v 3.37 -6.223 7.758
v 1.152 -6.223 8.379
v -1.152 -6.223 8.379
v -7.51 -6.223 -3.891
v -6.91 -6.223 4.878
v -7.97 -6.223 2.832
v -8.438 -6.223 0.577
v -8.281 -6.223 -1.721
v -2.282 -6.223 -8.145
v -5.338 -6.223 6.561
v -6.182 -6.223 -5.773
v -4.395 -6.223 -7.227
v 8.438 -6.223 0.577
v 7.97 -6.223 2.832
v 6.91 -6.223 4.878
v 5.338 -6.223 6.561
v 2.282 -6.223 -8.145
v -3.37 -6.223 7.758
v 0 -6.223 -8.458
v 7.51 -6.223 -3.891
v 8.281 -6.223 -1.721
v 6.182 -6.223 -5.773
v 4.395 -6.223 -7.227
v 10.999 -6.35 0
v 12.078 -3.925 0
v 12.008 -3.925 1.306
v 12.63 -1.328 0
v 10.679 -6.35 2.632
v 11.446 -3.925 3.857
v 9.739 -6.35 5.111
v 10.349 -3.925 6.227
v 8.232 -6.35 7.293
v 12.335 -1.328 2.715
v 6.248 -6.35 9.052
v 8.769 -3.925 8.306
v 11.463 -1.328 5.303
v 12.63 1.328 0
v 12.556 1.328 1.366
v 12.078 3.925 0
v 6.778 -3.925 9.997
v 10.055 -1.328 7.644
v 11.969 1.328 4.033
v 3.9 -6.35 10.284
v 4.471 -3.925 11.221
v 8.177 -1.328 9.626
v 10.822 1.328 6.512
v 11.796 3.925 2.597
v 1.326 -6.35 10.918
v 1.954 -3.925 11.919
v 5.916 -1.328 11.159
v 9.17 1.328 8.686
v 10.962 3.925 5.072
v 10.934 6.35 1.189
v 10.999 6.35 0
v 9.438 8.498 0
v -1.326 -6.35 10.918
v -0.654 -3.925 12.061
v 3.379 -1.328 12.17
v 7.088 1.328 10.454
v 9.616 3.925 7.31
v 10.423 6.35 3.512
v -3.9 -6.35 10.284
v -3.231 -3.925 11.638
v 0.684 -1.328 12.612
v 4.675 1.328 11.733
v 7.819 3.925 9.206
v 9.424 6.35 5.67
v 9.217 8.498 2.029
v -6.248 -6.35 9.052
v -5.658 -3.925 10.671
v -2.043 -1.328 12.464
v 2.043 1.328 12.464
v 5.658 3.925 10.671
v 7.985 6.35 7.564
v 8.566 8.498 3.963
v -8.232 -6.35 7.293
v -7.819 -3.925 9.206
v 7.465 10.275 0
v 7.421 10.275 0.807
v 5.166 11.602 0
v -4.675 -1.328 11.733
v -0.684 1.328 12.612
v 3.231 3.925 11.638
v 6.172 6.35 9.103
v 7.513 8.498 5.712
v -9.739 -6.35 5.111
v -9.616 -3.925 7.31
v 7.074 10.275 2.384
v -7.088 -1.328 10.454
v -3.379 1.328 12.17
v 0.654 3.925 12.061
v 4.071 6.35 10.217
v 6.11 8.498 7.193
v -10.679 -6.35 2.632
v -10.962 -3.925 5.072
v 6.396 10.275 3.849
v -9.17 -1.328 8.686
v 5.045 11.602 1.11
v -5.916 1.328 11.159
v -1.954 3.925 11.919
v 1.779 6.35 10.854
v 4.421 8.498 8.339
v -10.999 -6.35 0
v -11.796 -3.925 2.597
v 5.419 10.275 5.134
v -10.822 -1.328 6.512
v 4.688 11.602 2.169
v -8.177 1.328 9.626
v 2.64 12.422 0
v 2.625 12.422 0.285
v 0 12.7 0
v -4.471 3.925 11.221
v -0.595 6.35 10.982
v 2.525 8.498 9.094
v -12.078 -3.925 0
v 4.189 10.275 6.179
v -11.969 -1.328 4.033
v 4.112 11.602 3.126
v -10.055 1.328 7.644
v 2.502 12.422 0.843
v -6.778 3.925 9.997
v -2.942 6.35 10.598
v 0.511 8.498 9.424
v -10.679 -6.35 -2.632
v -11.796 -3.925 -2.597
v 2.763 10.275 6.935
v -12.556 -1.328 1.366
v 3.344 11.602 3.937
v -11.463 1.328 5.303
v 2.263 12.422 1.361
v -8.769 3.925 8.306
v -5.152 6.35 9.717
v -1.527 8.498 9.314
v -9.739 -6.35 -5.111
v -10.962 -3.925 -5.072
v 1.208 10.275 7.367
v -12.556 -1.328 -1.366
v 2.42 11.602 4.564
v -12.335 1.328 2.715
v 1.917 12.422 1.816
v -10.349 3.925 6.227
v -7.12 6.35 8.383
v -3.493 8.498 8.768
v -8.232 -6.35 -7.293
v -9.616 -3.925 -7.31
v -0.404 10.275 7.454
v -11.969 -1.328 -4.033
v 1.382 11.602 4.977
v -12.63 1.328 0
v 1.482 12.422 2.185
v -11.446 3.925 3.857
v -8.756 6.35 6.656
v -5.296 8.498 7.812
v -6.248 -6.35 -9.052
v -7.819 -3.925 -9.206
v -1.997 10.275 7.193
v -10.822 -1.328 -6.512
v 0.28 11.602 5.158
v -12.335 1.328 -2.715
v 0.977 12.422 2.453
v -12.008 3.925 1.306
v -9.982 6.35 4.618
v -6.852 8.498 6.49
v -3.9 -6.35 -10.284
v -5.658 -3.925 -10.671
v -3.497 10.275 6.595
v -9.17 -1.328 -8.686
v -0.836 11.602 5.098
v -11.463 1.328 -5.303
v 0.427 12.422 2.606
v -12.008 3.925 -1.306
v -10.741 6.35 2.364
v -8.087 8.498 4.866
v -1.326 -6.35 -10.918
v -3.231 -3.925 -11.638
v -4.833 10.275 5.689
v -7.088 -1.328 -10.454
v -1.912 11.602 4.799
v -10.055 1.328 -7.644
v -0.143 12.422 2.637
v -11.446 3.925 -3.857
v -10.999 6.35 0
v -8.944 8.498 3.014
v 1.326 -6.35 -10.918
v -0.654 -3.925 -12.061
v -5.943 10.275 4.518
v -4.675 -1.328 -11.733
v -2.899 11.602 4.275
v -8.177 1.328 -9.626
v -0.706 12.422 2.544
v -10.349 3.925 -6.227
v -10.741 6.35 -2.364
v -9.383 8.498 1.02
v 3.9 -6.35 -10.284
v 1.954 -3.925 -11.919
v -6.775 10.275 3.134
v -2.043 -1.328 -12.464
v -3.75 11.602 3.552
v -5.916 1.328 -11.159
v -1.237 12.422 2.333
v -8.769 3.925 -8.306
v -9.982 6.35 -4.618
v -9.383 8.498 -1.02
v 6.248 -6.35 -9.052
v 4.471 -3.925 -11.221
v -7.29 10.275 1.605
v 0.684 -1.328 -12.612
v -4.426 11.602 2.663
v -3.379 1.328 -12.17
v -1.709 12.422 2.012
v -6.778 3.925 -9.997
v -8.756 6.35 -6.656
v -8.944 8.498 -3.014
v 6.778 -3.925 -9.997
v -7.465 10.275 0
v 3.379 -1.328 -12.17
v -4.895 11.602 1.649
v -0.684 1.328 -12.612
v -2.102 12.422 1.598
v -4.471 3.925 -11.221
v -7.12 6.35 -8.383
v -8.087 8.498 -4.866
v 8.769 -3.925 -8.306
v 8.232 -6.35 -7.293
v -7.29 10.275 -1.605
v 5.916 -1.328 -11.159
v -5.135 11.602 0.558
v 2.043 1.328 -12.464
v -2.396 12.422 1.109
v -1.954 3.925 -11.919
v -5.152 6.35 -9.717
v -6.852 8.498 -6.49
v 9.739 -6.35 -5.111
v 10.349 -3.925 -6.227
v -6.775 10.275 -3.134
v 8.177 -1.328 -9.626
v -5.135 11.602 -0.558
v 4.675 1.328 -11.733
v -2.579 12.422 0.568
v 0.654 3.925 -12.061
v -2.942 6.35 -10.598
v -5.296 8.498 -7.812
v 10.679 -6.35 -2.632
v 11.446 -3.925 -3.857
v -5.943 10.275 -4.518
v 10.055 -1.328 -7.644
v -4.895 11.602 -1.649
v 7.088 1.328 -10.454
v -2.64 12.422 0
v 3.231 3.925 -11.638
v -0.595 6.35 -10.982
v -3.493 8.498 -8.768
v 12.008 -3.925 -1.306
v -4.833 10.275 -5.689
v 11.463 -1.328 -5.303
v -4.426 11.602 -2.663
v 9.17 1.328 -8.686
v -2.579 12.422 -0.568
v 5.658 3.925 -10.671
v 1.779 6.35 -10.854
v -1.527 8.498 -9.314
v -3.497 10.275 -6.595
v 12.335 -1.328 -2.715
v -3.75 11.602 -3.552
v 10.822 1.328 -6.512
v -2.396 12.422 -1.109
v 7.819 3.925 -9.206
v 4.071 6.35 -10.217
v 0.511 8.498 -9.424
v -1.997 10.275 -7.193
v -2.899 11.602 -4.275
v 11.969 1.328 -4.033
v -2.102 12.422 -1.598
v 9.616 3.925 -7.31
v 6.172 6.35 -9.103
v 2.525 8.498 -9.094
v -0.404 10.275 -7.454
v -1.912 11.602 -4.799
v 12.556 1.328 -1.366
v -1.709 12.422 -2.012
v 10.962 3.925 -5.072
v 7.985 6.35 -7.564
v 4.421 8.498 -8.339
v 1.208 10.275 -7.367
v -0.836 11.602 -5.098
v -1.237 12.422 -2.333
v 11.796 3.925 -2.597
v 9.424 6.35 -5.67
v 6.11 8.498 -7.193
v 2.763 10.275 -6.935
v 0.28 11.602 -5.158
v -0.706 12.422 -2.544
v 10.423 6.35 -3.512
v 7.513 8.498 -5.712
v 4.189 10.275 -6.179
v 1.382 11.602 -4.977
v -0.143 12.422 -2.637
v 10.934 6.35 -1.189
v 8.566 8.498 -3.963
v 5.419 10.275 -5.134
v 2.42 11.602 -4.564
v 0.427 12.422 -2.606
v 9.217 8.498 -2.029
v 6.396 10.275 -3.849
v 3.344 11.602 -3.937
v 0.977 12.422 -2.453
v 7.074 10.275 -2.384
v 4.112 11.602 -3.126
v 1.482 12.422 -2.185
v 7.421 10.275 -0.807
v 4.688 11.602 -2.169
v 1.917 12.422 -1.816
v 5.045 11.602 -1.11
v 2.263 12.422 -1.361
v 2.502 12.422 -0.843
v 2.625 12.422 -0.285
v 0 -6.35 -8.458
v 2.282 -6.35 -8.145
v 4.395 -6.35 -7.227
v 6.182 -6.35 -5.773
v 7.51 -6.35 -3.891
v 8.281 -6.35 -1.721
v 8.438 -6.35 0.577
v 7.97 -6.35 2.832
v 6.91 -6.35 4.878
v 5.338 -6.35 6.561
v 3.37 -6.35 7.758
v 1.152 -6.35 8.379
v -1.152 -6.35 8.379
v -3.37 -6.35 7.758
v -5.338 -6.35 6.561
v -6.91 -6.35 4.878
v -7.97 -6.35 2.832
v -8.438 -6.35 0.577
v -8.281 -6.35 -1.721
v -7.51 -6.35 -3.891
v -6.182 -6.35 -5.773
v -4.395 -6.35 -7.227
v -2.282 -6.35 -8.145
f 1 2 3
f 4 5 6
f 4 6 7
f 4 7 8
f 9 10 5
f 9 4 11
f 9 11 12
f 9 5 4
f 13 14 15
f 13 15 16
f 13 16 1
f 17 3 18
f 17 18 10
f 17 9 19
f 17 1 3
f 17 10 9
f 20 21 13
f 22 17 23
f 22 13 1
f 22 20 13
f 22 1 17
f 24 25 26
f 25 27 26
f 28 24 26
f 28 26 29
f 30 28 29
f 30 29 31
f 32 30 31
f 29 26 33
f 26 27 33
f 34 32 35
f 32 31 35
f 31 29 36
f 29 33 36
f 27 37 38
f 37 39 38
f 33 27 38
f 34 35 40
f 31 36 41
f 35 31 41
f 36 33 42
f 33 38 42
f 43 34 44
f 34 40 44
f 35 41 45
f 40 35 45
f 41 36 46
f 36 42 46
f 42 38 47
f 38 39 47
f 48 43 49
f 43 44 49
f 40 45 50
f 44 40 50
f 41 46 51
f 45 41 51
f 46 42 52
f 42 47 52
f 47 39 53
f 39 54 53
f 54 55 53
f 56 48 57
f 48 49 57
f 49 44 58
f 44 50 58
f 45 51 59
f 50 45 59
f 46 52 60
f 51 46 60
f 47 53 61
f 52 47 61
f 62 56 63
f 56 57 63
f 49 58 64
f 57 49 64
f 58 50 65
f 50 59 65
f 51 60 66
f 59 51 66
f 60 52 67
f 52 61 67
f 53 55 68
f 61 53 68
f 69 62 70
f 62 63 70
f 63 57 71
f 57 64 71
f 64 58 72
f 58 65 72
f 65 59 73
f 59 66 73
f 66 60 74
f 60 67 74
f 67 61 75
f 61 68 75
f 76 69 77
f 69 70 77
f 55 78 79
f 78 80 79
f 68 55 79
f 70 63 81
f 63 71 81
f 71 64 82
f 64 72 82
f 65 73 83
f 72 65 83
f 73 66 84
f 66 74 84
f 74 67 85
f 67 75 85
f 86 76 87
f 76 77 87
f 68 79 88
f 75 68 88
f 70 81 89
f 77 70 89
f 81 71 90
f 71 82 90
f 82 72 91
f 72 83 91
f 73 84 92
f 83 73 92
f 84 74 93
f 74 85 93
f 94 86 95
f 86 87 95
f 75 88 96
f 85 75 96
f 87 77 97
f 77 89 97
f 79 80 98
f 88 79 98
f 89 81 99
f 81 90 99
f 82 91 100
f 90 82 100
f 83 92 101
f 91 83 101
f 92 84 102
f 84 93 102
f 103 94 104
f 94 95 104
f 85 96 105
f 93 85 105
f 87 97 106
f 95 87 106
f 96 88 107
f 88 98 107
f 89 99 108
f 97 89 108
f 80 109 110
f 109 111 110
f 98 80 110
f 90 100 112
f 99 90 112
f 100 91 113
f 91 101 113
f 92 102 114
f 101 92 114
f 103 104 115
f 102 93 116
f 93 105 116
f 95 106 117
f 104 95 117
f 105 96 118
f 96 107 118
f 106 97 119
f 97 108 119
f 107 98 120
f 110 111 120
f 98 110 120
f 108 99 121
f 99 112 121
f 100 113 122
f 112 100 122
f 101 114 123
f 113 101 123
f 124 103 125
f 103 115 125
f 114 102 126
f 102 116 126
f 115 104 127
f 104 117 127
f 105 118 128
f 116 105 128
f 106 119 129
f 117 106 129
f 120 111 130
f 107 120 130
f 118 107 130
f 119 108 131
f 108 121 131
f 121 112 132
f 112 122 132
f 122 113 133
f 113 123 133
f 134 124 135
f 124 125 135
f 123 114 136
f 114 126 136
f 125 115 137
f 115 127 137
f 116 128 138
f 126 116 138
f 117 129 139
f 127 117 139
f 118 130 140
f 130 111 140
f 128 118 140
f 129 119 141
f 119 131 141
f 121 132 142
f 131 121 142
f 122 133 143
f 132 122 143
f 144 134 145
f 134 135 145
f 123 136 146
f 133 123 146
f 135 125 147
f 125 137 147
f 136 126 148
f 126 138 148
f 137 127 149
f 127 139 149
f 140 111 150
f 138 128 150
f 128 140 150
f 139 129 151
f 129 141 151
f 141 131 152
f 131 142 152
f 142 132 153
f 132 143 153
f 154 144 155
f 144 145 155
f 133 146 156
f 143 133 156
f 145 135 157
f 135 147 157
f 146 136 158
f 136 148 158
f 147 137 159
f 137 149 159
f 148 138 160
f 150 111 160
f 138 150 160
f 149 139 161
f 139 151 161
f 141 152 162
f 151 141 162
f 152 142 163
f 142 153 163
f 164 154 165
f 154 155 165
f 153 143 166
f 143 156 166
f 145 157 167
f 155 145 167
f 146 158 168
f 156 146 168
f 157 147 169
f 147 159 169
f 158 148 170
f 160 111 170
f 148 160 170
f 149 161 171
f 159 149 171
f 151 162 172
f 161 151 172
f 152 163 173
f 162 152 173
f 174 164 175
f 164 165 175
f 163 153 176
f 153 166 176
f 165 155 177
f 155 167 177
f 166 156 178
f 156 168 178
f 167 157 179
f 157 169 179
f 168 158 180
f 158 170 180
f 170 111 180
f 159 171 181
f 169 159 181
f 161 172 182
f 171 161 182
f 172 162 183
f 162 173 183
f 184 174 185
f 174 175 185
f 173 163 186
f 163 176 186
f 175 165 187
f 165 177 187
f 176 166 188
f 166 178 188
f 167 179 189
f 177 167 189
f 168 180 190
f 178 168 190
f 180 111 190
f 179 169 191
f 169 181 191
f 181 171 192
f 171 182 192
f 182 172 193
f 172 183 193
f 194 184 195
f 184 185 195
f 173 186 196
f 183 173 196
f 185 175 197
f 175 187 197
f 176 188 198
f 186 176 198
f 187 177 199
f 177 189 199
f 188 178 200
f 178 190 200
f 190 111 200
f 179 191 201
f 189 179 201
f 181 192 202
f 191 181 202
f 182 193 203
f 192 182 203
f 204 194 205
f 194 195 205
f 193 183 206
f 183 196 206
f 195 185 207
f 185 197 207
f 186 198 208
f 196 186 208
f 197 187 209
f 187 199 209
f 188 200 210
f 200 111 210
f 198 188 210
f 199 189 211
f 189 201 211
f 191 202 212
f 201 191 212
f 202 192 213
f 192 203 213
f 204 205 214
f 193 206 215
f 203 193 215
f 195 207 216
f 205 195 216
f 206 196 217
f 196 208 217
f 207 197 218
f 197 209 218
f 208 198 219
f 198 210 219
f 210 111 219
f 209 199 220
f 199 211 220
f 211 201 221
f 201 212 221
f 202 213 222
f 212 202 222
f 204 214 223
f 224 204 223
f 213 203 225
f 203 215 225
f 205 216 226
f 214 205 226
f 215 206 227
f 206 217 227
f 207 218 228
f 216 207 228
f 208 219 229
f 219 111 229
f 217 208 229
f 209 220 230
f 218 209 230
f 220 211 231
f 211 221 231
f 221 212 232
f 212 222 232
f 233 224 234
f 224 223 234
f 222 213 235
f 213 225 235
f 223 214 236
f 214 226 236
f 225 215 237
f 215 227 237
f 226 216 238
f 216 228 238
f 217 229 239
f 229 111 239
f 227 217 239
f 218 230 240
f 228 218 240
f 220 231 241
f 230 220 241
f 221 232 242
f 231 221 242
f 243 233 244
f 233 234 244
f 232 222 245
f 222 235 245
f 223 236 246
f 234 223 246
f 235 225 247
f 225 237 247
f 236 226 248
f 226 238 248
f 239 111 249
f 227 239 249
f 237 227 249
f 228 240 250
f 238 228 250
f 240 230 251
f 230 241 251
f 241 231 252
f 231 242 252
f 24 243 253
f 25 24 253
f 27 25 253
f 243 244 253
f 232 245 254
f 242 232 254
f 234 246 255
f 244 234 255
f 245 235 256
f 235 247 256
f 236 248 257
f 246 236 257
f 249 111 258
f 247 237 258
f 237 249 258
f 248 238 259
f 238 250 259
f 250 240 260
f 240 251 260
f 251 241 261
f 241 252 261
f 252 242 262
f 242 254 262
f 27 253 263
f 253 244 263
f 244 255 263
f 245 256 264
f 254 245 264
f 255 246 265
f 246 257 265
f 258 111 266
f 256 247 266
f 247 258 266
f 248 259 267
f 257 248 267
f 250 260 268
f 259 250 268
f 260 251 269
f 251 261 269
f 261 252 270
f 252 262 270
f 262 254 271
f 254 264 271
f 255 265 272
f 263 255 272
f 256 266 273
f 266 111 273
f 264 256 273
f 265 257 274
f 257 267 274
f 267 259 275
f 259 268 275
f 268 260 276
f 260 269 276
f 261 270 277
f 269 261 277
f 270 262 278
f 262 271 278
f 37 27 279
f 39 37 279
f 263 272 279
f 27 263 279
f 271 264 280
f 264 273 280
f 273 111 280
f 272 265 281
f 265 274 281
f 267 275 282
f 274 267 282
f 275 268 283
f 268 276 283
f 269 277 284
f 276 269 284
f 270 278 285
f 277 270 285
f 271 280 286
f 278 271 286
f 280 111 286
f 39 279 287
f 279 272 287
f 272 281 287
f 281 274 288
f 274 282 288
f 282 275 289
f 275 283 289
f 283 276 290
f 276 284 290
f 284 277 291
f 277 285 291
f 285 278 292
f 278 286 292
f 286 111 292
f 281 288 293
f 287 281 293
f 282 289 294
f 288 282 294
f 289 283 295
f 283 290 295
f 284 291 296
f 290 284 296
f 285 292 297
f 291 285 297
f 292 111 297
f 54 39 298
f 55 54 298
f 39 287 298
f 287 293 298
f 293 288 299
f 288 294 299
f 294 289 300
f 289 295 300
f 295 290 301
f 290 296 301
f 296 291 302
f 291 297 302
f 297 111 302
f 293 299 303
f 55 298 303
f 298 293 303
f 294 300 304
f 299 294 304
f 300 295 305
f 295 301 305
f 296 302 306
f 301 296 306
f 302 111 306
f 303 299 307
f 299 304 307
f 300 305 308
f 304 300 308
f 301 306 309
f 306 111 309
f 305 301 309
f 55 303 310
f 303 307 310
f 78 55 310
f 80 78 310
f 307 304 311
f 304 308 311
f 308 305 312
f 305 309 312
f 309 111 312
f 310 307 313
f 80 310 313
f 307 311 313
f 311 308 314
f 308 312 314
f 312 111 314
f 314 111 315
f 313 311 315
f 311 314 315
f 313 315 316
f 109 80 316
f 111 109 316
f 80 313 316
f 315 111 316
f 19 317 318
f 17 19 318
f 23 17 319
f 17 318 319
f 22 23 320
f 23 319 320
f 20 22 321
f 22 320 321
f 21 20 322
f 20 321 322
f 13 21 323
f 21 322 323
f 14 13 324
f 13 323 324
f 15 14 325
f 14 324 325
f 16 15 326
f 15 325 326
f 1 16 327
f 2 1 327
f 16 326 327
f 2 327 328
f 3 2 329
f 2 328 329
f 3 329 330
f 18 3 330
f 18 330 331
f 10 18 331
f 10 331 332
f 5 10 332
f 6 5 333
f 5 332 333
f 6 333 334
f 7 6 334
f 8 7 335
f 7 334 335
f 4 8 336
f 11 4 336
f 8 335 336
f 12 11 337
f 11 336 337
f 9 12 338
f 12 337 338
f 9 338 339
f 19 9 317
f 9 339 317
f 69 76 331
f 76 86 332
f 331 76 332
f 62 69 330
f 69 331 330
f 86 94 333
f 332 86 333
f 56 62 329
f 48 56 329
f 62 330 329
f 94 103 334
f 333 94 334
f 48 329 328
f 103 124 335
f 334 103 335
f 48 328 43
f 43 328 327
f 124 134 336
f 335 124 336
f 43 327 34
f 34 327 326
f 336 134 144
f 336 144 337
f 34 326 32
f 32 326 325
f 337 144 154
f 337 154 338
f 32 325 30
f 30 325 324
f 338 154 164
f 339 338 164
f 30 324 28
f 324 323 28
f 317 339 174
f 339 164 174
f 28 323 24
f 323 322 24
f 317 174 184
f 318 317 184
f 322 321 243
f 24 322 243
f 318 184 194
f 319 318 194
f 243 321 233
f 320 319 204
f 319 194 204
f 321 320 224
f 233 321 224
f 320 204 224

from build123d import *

# Parameters (mm, degrees)
TRUNCATED_BALL_DEPTH      = 13.7
TRUNCATED_BALL_DEPTH_BACK = 13.7
SKETCH3_R                 = 8.4582
RECESSED_DEPTH            = 0.127


with BuildPart() as part:
    # Sketch1 → Complete_Ball (revolve)
    with BuildSketch(Plane.XY):
        with BuildLine():
            Line((0, 12.7), (0, -12.7))
            ThreePointArc((0, -12.7), (12.7, 0), (0, 12.7))
        make_face()
    revolve(axis=Axis((0, 13.6525, 0), (0, -1, 0)))

    # Sketch2 → Truncated_ball (cut, two sides)
    with BuildSketch(Plane.XY) as truncated_ball_sk:
        with BuildLine():
            Line((-10.998522628, -6.35), (10.998522628, -6.35))
            ThreePointArc((10.998522628, -6.35), (0, -12.7), (-10.998522628, -6.35))
        make_face()
    extrude(amount=TRUNCATED_BALL_DEPTH, mode=Mode.SUBTRACT)
    extrude(truncated_ball_sk.sketch, amount=-TRUNCATED_BALL_DEPTH_BACK, mode=Mode.SUBTRACT)

    # Sketch3 → Recessed (cut)
    with BuildSketch(Plane.XZ.offset(6.35)):
        with Locations(Location((0, 0, 0), (0, 0, 270))):  # turned: the seam where the file's is
            Circle(SKETCH3_R)
    extrude(amount=-RECESSED_DEPTH, mode=Mode.SUBTRACT)


solid = part.part
